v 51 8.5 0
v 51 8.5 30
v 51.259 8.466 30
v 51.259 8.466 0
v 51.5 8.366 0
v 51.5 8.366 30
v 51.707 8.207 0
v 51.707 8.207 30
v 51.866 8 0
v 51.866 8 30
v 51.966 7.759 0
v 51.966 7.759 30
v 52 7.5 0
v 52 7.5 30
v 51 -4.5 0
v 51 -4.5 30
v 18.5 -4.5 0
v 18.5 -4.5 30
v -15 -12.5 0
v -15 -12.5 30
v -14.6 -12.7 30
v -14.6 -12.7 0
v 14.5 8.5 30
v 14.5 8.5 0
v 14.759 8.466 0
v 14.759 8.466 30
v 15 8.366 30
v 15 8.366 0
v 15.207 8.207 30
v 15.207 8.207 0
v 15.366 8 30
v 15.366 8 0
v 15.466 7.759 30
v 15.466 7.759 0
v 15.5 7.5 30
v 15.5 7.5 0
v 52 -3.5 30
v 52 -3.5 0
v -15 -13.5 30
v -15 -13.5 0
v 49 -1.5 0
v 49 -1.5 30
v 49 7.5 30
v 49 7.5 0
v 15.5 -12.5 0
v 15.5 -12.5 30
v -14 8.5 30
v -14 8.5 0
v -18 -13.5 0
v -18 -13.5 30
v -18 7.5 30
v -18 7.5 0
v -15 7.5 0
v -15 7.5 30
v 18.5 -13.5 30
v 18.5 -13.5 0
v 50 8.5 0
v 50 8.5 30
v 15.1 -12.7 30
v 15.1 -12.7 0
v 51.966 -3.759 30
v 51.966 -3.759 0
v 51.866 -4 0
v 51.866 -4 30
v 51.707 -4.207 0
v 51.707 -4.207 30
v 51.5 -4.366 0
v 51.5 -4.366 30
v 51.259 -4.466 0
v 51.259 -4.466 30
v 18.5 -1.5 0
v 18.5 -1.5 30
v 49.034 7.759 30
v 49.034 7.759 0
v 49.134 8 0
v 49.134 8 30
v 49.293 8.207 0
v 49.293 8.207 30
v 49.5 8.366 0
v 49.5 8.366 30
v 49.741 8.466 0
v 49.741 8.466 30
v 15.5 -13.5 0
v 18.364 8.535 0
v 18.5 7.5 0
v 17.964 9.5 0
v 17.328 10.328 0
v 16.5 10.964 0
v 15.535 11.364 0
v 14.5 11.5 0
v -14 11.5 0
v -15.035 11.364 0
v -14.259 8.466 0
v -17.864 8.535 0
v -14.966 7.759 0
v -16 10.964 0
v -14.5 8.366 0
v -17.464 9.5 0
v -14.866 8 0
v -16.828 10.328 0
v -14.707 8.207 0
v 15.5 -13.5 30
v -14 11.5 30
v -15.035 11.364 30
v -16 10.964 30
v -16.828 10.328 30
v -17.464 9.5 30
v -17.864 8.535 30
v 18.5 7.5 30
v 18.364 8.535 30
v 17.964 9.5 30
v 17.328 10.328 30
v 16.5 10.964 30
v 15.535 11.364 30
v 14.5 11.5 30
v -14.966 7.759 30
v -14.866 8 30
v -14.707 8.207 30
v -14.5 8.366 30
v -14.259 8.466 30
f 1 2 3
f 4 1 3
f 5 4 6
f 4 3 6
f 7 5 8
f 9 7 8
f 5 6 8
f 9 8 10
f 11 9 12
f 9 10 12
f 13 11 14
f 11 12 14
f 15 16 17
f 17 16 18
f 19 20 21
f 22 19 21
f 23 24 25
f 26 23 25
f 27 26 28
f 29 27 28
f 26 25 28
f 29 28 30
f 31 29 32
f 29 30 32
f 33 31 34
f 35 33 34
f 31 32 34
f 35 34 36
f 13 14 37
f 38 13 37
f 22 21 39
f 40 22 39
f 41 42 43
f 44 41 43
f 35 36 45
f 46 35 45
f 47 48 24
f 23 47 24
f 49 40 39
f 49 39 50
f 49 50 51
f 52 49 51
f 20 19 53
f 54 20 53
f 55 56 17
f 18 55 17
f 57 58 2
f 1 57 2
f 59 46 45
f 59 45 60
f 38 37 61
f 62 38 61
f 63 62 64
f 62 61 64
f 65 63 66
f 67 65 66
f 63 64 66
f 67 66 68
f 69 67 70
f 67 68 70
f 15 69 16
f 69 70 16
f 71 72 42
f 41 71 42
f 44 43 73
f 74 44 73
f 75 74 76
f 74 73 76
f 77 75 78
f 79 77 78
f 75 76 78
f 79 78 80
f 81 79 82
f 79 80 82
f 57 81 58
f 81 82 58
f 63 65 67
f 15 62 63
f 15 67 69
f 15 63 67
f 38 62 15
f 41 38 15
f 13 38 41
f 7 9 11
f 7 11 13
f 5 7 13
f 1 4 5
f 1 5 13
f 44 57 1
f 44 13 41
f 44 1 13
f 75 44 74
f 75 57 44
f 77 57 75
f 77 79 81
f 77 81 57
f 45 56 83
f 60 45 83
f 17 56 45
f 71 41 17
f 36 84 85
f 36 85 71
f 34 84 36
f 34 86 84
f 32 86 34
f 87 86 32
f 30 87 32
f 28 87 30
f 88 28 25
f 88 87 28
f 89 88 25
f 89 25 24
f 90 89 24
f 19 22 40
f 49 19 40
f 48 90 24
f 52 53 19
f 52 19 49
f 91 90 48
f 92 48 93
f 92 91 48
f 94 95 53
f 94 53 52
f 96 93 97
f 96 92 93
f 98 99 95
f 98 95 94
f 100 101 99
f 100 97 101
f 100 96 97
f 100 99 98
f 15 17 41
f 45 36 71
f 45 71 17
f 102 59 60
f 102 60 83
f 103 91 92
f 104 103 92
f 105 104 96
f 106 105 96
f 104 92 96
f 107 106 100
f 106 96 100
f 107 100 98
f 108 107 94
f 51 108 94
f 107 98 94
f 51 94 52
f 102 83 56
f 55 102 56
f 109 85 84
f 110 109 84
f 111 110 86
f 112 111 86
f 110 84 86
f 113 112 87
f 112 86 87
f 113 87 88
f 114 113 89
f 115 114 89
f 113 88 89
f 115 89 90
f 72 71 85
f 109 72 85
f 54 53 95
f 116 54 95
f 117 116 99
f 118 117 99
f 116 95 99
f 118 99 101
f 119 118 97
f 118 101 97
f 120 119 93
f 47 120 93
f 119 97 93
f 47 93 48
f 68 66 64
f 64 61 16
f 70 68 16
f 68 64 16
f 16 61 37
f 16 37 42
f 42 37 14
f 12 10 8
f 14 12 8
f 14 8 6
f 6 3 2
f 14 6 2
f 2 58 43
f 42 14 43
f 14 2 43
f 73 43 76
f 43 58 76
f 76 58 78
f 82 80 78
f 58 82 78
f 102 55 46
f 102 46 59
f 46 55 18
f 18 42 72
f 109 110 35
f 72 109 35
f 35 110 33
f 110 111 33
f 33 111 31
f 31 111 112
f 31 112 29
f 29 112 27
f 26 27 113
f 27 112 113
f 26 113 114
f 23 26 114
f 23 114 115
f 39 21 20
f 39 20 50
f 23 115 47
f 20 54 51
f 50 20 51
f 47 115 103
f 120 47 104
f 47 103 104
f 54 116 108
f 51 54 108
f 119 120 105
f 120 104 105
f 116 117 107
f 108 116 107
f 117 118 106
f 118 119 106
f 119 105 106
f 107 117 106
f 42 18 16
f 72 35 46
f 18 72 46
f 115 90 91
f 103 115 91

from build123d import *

# Parameters (mm, degrees)
EXTRUDE_THIN1_DEPTH = 30
BOSS_EXTRUDE1_DEPTH = 30
SKETCH3_W           = 30
SKETCH3_H           = 3
EXTRUDE_THIN2_DEPTH = 30
BOSS_EXTRUDE2_DEPTH = 30


with BuildPart() as part:
    # Sketch1 → Extrude-Thin1 (new body)
    with BuildSketch(Plane.XY):
        with BuildLine():
            Line((-15, -12.5), (-15, 7.5))
            ThreePointArc((-15, 7.5), (-14.707106781, 8.207106781), (-14, 8.5))
            Line((-14, 8.5), (14.5, 8.5))
            ThreePointArc((14.5, 8.5), (15.207106781, 8.207106781), (15.5, 7.5))
            Line((15.5, 7.5), (15.5, -12.5))
            Line((15.5, -12.5), (18.5, -12.5))
            Line((18.5, -12.5), (18.5, 7.5))
            ThreePointArc((18.5, 7.5), (17.328427125, 10.328427125), (14.5, 11.5))
            Line((14.5, 11.5), (-14, 11.5))
            ThreePointArc((-14, 11.5), (-16.828427125, 10.328427125), (-18, 7.5))
            Line((-18, 7.5), (-18, -12.5))
            Line((-18, -12.5), (-15, -12.5))
        make_face()
    extrude(amount=EXTRUDE_THIN1_DEPTH)

    # Sketch2 → Boss-Extrude1 (add)
    with BuildSketch(Plane.XY.offset(30)):
        Polygon((-15, -13.5), (-18, -13.5), (-18, -12.5), (-15, -12.5), (-14.6, -12.7), align=None)
        Polygon((15.5, -12.5), (15.1, -12.7), (15.5, -13.5), (18.5, -13.5), (18.5, -12.5), align=None)
    extrude(amount=-BOSS_EXTRUDE1_DEPTH)

    # Sketch3 → Extrude-Thin2 (add)
    with BuildSketch(Plane(origin=(18.5, 0, 0), x_dir=(0, 0, -1), z_dir=(1, 0, 0))):
        with Locations((-15, -3)):
            Rectangle(SKETCH3_W, SKETCH3_H)
    extrude(amount=EXTRUDE_THIN2_DEPTH)

    # Sketch4 → Boss-Extrude2 (add)
    with BuildSketch(Plane.XY.offset(30)):
        with BuildLine():
            Line((48.5, -1.5), (49, -1.5))
            Line((49, -1.5), (49, 7.5))
            ThreePointArc((49, 7.5), (49.292893219, 8.207106781), (50, 8.5))
            Line((50, 8.5), (51, 8.5))
            ThreePointArc((51, 8.5), (51.707106781, 8.207106781), (52, 7.5))
            Line((52, 7.5), (52, -3.5))
            ThreePointArc((52, -3.5), (51.707106781, -4.207106781), (51, -4.5))
            Line((51, -4.5), (48.5, -4.5))
            Line((48.5, -4.5), (48.5, -1.5))
        make_face()
    extrude(amount=-BOSS_EXTRUDE2_DEPTH)


solid = part.part
